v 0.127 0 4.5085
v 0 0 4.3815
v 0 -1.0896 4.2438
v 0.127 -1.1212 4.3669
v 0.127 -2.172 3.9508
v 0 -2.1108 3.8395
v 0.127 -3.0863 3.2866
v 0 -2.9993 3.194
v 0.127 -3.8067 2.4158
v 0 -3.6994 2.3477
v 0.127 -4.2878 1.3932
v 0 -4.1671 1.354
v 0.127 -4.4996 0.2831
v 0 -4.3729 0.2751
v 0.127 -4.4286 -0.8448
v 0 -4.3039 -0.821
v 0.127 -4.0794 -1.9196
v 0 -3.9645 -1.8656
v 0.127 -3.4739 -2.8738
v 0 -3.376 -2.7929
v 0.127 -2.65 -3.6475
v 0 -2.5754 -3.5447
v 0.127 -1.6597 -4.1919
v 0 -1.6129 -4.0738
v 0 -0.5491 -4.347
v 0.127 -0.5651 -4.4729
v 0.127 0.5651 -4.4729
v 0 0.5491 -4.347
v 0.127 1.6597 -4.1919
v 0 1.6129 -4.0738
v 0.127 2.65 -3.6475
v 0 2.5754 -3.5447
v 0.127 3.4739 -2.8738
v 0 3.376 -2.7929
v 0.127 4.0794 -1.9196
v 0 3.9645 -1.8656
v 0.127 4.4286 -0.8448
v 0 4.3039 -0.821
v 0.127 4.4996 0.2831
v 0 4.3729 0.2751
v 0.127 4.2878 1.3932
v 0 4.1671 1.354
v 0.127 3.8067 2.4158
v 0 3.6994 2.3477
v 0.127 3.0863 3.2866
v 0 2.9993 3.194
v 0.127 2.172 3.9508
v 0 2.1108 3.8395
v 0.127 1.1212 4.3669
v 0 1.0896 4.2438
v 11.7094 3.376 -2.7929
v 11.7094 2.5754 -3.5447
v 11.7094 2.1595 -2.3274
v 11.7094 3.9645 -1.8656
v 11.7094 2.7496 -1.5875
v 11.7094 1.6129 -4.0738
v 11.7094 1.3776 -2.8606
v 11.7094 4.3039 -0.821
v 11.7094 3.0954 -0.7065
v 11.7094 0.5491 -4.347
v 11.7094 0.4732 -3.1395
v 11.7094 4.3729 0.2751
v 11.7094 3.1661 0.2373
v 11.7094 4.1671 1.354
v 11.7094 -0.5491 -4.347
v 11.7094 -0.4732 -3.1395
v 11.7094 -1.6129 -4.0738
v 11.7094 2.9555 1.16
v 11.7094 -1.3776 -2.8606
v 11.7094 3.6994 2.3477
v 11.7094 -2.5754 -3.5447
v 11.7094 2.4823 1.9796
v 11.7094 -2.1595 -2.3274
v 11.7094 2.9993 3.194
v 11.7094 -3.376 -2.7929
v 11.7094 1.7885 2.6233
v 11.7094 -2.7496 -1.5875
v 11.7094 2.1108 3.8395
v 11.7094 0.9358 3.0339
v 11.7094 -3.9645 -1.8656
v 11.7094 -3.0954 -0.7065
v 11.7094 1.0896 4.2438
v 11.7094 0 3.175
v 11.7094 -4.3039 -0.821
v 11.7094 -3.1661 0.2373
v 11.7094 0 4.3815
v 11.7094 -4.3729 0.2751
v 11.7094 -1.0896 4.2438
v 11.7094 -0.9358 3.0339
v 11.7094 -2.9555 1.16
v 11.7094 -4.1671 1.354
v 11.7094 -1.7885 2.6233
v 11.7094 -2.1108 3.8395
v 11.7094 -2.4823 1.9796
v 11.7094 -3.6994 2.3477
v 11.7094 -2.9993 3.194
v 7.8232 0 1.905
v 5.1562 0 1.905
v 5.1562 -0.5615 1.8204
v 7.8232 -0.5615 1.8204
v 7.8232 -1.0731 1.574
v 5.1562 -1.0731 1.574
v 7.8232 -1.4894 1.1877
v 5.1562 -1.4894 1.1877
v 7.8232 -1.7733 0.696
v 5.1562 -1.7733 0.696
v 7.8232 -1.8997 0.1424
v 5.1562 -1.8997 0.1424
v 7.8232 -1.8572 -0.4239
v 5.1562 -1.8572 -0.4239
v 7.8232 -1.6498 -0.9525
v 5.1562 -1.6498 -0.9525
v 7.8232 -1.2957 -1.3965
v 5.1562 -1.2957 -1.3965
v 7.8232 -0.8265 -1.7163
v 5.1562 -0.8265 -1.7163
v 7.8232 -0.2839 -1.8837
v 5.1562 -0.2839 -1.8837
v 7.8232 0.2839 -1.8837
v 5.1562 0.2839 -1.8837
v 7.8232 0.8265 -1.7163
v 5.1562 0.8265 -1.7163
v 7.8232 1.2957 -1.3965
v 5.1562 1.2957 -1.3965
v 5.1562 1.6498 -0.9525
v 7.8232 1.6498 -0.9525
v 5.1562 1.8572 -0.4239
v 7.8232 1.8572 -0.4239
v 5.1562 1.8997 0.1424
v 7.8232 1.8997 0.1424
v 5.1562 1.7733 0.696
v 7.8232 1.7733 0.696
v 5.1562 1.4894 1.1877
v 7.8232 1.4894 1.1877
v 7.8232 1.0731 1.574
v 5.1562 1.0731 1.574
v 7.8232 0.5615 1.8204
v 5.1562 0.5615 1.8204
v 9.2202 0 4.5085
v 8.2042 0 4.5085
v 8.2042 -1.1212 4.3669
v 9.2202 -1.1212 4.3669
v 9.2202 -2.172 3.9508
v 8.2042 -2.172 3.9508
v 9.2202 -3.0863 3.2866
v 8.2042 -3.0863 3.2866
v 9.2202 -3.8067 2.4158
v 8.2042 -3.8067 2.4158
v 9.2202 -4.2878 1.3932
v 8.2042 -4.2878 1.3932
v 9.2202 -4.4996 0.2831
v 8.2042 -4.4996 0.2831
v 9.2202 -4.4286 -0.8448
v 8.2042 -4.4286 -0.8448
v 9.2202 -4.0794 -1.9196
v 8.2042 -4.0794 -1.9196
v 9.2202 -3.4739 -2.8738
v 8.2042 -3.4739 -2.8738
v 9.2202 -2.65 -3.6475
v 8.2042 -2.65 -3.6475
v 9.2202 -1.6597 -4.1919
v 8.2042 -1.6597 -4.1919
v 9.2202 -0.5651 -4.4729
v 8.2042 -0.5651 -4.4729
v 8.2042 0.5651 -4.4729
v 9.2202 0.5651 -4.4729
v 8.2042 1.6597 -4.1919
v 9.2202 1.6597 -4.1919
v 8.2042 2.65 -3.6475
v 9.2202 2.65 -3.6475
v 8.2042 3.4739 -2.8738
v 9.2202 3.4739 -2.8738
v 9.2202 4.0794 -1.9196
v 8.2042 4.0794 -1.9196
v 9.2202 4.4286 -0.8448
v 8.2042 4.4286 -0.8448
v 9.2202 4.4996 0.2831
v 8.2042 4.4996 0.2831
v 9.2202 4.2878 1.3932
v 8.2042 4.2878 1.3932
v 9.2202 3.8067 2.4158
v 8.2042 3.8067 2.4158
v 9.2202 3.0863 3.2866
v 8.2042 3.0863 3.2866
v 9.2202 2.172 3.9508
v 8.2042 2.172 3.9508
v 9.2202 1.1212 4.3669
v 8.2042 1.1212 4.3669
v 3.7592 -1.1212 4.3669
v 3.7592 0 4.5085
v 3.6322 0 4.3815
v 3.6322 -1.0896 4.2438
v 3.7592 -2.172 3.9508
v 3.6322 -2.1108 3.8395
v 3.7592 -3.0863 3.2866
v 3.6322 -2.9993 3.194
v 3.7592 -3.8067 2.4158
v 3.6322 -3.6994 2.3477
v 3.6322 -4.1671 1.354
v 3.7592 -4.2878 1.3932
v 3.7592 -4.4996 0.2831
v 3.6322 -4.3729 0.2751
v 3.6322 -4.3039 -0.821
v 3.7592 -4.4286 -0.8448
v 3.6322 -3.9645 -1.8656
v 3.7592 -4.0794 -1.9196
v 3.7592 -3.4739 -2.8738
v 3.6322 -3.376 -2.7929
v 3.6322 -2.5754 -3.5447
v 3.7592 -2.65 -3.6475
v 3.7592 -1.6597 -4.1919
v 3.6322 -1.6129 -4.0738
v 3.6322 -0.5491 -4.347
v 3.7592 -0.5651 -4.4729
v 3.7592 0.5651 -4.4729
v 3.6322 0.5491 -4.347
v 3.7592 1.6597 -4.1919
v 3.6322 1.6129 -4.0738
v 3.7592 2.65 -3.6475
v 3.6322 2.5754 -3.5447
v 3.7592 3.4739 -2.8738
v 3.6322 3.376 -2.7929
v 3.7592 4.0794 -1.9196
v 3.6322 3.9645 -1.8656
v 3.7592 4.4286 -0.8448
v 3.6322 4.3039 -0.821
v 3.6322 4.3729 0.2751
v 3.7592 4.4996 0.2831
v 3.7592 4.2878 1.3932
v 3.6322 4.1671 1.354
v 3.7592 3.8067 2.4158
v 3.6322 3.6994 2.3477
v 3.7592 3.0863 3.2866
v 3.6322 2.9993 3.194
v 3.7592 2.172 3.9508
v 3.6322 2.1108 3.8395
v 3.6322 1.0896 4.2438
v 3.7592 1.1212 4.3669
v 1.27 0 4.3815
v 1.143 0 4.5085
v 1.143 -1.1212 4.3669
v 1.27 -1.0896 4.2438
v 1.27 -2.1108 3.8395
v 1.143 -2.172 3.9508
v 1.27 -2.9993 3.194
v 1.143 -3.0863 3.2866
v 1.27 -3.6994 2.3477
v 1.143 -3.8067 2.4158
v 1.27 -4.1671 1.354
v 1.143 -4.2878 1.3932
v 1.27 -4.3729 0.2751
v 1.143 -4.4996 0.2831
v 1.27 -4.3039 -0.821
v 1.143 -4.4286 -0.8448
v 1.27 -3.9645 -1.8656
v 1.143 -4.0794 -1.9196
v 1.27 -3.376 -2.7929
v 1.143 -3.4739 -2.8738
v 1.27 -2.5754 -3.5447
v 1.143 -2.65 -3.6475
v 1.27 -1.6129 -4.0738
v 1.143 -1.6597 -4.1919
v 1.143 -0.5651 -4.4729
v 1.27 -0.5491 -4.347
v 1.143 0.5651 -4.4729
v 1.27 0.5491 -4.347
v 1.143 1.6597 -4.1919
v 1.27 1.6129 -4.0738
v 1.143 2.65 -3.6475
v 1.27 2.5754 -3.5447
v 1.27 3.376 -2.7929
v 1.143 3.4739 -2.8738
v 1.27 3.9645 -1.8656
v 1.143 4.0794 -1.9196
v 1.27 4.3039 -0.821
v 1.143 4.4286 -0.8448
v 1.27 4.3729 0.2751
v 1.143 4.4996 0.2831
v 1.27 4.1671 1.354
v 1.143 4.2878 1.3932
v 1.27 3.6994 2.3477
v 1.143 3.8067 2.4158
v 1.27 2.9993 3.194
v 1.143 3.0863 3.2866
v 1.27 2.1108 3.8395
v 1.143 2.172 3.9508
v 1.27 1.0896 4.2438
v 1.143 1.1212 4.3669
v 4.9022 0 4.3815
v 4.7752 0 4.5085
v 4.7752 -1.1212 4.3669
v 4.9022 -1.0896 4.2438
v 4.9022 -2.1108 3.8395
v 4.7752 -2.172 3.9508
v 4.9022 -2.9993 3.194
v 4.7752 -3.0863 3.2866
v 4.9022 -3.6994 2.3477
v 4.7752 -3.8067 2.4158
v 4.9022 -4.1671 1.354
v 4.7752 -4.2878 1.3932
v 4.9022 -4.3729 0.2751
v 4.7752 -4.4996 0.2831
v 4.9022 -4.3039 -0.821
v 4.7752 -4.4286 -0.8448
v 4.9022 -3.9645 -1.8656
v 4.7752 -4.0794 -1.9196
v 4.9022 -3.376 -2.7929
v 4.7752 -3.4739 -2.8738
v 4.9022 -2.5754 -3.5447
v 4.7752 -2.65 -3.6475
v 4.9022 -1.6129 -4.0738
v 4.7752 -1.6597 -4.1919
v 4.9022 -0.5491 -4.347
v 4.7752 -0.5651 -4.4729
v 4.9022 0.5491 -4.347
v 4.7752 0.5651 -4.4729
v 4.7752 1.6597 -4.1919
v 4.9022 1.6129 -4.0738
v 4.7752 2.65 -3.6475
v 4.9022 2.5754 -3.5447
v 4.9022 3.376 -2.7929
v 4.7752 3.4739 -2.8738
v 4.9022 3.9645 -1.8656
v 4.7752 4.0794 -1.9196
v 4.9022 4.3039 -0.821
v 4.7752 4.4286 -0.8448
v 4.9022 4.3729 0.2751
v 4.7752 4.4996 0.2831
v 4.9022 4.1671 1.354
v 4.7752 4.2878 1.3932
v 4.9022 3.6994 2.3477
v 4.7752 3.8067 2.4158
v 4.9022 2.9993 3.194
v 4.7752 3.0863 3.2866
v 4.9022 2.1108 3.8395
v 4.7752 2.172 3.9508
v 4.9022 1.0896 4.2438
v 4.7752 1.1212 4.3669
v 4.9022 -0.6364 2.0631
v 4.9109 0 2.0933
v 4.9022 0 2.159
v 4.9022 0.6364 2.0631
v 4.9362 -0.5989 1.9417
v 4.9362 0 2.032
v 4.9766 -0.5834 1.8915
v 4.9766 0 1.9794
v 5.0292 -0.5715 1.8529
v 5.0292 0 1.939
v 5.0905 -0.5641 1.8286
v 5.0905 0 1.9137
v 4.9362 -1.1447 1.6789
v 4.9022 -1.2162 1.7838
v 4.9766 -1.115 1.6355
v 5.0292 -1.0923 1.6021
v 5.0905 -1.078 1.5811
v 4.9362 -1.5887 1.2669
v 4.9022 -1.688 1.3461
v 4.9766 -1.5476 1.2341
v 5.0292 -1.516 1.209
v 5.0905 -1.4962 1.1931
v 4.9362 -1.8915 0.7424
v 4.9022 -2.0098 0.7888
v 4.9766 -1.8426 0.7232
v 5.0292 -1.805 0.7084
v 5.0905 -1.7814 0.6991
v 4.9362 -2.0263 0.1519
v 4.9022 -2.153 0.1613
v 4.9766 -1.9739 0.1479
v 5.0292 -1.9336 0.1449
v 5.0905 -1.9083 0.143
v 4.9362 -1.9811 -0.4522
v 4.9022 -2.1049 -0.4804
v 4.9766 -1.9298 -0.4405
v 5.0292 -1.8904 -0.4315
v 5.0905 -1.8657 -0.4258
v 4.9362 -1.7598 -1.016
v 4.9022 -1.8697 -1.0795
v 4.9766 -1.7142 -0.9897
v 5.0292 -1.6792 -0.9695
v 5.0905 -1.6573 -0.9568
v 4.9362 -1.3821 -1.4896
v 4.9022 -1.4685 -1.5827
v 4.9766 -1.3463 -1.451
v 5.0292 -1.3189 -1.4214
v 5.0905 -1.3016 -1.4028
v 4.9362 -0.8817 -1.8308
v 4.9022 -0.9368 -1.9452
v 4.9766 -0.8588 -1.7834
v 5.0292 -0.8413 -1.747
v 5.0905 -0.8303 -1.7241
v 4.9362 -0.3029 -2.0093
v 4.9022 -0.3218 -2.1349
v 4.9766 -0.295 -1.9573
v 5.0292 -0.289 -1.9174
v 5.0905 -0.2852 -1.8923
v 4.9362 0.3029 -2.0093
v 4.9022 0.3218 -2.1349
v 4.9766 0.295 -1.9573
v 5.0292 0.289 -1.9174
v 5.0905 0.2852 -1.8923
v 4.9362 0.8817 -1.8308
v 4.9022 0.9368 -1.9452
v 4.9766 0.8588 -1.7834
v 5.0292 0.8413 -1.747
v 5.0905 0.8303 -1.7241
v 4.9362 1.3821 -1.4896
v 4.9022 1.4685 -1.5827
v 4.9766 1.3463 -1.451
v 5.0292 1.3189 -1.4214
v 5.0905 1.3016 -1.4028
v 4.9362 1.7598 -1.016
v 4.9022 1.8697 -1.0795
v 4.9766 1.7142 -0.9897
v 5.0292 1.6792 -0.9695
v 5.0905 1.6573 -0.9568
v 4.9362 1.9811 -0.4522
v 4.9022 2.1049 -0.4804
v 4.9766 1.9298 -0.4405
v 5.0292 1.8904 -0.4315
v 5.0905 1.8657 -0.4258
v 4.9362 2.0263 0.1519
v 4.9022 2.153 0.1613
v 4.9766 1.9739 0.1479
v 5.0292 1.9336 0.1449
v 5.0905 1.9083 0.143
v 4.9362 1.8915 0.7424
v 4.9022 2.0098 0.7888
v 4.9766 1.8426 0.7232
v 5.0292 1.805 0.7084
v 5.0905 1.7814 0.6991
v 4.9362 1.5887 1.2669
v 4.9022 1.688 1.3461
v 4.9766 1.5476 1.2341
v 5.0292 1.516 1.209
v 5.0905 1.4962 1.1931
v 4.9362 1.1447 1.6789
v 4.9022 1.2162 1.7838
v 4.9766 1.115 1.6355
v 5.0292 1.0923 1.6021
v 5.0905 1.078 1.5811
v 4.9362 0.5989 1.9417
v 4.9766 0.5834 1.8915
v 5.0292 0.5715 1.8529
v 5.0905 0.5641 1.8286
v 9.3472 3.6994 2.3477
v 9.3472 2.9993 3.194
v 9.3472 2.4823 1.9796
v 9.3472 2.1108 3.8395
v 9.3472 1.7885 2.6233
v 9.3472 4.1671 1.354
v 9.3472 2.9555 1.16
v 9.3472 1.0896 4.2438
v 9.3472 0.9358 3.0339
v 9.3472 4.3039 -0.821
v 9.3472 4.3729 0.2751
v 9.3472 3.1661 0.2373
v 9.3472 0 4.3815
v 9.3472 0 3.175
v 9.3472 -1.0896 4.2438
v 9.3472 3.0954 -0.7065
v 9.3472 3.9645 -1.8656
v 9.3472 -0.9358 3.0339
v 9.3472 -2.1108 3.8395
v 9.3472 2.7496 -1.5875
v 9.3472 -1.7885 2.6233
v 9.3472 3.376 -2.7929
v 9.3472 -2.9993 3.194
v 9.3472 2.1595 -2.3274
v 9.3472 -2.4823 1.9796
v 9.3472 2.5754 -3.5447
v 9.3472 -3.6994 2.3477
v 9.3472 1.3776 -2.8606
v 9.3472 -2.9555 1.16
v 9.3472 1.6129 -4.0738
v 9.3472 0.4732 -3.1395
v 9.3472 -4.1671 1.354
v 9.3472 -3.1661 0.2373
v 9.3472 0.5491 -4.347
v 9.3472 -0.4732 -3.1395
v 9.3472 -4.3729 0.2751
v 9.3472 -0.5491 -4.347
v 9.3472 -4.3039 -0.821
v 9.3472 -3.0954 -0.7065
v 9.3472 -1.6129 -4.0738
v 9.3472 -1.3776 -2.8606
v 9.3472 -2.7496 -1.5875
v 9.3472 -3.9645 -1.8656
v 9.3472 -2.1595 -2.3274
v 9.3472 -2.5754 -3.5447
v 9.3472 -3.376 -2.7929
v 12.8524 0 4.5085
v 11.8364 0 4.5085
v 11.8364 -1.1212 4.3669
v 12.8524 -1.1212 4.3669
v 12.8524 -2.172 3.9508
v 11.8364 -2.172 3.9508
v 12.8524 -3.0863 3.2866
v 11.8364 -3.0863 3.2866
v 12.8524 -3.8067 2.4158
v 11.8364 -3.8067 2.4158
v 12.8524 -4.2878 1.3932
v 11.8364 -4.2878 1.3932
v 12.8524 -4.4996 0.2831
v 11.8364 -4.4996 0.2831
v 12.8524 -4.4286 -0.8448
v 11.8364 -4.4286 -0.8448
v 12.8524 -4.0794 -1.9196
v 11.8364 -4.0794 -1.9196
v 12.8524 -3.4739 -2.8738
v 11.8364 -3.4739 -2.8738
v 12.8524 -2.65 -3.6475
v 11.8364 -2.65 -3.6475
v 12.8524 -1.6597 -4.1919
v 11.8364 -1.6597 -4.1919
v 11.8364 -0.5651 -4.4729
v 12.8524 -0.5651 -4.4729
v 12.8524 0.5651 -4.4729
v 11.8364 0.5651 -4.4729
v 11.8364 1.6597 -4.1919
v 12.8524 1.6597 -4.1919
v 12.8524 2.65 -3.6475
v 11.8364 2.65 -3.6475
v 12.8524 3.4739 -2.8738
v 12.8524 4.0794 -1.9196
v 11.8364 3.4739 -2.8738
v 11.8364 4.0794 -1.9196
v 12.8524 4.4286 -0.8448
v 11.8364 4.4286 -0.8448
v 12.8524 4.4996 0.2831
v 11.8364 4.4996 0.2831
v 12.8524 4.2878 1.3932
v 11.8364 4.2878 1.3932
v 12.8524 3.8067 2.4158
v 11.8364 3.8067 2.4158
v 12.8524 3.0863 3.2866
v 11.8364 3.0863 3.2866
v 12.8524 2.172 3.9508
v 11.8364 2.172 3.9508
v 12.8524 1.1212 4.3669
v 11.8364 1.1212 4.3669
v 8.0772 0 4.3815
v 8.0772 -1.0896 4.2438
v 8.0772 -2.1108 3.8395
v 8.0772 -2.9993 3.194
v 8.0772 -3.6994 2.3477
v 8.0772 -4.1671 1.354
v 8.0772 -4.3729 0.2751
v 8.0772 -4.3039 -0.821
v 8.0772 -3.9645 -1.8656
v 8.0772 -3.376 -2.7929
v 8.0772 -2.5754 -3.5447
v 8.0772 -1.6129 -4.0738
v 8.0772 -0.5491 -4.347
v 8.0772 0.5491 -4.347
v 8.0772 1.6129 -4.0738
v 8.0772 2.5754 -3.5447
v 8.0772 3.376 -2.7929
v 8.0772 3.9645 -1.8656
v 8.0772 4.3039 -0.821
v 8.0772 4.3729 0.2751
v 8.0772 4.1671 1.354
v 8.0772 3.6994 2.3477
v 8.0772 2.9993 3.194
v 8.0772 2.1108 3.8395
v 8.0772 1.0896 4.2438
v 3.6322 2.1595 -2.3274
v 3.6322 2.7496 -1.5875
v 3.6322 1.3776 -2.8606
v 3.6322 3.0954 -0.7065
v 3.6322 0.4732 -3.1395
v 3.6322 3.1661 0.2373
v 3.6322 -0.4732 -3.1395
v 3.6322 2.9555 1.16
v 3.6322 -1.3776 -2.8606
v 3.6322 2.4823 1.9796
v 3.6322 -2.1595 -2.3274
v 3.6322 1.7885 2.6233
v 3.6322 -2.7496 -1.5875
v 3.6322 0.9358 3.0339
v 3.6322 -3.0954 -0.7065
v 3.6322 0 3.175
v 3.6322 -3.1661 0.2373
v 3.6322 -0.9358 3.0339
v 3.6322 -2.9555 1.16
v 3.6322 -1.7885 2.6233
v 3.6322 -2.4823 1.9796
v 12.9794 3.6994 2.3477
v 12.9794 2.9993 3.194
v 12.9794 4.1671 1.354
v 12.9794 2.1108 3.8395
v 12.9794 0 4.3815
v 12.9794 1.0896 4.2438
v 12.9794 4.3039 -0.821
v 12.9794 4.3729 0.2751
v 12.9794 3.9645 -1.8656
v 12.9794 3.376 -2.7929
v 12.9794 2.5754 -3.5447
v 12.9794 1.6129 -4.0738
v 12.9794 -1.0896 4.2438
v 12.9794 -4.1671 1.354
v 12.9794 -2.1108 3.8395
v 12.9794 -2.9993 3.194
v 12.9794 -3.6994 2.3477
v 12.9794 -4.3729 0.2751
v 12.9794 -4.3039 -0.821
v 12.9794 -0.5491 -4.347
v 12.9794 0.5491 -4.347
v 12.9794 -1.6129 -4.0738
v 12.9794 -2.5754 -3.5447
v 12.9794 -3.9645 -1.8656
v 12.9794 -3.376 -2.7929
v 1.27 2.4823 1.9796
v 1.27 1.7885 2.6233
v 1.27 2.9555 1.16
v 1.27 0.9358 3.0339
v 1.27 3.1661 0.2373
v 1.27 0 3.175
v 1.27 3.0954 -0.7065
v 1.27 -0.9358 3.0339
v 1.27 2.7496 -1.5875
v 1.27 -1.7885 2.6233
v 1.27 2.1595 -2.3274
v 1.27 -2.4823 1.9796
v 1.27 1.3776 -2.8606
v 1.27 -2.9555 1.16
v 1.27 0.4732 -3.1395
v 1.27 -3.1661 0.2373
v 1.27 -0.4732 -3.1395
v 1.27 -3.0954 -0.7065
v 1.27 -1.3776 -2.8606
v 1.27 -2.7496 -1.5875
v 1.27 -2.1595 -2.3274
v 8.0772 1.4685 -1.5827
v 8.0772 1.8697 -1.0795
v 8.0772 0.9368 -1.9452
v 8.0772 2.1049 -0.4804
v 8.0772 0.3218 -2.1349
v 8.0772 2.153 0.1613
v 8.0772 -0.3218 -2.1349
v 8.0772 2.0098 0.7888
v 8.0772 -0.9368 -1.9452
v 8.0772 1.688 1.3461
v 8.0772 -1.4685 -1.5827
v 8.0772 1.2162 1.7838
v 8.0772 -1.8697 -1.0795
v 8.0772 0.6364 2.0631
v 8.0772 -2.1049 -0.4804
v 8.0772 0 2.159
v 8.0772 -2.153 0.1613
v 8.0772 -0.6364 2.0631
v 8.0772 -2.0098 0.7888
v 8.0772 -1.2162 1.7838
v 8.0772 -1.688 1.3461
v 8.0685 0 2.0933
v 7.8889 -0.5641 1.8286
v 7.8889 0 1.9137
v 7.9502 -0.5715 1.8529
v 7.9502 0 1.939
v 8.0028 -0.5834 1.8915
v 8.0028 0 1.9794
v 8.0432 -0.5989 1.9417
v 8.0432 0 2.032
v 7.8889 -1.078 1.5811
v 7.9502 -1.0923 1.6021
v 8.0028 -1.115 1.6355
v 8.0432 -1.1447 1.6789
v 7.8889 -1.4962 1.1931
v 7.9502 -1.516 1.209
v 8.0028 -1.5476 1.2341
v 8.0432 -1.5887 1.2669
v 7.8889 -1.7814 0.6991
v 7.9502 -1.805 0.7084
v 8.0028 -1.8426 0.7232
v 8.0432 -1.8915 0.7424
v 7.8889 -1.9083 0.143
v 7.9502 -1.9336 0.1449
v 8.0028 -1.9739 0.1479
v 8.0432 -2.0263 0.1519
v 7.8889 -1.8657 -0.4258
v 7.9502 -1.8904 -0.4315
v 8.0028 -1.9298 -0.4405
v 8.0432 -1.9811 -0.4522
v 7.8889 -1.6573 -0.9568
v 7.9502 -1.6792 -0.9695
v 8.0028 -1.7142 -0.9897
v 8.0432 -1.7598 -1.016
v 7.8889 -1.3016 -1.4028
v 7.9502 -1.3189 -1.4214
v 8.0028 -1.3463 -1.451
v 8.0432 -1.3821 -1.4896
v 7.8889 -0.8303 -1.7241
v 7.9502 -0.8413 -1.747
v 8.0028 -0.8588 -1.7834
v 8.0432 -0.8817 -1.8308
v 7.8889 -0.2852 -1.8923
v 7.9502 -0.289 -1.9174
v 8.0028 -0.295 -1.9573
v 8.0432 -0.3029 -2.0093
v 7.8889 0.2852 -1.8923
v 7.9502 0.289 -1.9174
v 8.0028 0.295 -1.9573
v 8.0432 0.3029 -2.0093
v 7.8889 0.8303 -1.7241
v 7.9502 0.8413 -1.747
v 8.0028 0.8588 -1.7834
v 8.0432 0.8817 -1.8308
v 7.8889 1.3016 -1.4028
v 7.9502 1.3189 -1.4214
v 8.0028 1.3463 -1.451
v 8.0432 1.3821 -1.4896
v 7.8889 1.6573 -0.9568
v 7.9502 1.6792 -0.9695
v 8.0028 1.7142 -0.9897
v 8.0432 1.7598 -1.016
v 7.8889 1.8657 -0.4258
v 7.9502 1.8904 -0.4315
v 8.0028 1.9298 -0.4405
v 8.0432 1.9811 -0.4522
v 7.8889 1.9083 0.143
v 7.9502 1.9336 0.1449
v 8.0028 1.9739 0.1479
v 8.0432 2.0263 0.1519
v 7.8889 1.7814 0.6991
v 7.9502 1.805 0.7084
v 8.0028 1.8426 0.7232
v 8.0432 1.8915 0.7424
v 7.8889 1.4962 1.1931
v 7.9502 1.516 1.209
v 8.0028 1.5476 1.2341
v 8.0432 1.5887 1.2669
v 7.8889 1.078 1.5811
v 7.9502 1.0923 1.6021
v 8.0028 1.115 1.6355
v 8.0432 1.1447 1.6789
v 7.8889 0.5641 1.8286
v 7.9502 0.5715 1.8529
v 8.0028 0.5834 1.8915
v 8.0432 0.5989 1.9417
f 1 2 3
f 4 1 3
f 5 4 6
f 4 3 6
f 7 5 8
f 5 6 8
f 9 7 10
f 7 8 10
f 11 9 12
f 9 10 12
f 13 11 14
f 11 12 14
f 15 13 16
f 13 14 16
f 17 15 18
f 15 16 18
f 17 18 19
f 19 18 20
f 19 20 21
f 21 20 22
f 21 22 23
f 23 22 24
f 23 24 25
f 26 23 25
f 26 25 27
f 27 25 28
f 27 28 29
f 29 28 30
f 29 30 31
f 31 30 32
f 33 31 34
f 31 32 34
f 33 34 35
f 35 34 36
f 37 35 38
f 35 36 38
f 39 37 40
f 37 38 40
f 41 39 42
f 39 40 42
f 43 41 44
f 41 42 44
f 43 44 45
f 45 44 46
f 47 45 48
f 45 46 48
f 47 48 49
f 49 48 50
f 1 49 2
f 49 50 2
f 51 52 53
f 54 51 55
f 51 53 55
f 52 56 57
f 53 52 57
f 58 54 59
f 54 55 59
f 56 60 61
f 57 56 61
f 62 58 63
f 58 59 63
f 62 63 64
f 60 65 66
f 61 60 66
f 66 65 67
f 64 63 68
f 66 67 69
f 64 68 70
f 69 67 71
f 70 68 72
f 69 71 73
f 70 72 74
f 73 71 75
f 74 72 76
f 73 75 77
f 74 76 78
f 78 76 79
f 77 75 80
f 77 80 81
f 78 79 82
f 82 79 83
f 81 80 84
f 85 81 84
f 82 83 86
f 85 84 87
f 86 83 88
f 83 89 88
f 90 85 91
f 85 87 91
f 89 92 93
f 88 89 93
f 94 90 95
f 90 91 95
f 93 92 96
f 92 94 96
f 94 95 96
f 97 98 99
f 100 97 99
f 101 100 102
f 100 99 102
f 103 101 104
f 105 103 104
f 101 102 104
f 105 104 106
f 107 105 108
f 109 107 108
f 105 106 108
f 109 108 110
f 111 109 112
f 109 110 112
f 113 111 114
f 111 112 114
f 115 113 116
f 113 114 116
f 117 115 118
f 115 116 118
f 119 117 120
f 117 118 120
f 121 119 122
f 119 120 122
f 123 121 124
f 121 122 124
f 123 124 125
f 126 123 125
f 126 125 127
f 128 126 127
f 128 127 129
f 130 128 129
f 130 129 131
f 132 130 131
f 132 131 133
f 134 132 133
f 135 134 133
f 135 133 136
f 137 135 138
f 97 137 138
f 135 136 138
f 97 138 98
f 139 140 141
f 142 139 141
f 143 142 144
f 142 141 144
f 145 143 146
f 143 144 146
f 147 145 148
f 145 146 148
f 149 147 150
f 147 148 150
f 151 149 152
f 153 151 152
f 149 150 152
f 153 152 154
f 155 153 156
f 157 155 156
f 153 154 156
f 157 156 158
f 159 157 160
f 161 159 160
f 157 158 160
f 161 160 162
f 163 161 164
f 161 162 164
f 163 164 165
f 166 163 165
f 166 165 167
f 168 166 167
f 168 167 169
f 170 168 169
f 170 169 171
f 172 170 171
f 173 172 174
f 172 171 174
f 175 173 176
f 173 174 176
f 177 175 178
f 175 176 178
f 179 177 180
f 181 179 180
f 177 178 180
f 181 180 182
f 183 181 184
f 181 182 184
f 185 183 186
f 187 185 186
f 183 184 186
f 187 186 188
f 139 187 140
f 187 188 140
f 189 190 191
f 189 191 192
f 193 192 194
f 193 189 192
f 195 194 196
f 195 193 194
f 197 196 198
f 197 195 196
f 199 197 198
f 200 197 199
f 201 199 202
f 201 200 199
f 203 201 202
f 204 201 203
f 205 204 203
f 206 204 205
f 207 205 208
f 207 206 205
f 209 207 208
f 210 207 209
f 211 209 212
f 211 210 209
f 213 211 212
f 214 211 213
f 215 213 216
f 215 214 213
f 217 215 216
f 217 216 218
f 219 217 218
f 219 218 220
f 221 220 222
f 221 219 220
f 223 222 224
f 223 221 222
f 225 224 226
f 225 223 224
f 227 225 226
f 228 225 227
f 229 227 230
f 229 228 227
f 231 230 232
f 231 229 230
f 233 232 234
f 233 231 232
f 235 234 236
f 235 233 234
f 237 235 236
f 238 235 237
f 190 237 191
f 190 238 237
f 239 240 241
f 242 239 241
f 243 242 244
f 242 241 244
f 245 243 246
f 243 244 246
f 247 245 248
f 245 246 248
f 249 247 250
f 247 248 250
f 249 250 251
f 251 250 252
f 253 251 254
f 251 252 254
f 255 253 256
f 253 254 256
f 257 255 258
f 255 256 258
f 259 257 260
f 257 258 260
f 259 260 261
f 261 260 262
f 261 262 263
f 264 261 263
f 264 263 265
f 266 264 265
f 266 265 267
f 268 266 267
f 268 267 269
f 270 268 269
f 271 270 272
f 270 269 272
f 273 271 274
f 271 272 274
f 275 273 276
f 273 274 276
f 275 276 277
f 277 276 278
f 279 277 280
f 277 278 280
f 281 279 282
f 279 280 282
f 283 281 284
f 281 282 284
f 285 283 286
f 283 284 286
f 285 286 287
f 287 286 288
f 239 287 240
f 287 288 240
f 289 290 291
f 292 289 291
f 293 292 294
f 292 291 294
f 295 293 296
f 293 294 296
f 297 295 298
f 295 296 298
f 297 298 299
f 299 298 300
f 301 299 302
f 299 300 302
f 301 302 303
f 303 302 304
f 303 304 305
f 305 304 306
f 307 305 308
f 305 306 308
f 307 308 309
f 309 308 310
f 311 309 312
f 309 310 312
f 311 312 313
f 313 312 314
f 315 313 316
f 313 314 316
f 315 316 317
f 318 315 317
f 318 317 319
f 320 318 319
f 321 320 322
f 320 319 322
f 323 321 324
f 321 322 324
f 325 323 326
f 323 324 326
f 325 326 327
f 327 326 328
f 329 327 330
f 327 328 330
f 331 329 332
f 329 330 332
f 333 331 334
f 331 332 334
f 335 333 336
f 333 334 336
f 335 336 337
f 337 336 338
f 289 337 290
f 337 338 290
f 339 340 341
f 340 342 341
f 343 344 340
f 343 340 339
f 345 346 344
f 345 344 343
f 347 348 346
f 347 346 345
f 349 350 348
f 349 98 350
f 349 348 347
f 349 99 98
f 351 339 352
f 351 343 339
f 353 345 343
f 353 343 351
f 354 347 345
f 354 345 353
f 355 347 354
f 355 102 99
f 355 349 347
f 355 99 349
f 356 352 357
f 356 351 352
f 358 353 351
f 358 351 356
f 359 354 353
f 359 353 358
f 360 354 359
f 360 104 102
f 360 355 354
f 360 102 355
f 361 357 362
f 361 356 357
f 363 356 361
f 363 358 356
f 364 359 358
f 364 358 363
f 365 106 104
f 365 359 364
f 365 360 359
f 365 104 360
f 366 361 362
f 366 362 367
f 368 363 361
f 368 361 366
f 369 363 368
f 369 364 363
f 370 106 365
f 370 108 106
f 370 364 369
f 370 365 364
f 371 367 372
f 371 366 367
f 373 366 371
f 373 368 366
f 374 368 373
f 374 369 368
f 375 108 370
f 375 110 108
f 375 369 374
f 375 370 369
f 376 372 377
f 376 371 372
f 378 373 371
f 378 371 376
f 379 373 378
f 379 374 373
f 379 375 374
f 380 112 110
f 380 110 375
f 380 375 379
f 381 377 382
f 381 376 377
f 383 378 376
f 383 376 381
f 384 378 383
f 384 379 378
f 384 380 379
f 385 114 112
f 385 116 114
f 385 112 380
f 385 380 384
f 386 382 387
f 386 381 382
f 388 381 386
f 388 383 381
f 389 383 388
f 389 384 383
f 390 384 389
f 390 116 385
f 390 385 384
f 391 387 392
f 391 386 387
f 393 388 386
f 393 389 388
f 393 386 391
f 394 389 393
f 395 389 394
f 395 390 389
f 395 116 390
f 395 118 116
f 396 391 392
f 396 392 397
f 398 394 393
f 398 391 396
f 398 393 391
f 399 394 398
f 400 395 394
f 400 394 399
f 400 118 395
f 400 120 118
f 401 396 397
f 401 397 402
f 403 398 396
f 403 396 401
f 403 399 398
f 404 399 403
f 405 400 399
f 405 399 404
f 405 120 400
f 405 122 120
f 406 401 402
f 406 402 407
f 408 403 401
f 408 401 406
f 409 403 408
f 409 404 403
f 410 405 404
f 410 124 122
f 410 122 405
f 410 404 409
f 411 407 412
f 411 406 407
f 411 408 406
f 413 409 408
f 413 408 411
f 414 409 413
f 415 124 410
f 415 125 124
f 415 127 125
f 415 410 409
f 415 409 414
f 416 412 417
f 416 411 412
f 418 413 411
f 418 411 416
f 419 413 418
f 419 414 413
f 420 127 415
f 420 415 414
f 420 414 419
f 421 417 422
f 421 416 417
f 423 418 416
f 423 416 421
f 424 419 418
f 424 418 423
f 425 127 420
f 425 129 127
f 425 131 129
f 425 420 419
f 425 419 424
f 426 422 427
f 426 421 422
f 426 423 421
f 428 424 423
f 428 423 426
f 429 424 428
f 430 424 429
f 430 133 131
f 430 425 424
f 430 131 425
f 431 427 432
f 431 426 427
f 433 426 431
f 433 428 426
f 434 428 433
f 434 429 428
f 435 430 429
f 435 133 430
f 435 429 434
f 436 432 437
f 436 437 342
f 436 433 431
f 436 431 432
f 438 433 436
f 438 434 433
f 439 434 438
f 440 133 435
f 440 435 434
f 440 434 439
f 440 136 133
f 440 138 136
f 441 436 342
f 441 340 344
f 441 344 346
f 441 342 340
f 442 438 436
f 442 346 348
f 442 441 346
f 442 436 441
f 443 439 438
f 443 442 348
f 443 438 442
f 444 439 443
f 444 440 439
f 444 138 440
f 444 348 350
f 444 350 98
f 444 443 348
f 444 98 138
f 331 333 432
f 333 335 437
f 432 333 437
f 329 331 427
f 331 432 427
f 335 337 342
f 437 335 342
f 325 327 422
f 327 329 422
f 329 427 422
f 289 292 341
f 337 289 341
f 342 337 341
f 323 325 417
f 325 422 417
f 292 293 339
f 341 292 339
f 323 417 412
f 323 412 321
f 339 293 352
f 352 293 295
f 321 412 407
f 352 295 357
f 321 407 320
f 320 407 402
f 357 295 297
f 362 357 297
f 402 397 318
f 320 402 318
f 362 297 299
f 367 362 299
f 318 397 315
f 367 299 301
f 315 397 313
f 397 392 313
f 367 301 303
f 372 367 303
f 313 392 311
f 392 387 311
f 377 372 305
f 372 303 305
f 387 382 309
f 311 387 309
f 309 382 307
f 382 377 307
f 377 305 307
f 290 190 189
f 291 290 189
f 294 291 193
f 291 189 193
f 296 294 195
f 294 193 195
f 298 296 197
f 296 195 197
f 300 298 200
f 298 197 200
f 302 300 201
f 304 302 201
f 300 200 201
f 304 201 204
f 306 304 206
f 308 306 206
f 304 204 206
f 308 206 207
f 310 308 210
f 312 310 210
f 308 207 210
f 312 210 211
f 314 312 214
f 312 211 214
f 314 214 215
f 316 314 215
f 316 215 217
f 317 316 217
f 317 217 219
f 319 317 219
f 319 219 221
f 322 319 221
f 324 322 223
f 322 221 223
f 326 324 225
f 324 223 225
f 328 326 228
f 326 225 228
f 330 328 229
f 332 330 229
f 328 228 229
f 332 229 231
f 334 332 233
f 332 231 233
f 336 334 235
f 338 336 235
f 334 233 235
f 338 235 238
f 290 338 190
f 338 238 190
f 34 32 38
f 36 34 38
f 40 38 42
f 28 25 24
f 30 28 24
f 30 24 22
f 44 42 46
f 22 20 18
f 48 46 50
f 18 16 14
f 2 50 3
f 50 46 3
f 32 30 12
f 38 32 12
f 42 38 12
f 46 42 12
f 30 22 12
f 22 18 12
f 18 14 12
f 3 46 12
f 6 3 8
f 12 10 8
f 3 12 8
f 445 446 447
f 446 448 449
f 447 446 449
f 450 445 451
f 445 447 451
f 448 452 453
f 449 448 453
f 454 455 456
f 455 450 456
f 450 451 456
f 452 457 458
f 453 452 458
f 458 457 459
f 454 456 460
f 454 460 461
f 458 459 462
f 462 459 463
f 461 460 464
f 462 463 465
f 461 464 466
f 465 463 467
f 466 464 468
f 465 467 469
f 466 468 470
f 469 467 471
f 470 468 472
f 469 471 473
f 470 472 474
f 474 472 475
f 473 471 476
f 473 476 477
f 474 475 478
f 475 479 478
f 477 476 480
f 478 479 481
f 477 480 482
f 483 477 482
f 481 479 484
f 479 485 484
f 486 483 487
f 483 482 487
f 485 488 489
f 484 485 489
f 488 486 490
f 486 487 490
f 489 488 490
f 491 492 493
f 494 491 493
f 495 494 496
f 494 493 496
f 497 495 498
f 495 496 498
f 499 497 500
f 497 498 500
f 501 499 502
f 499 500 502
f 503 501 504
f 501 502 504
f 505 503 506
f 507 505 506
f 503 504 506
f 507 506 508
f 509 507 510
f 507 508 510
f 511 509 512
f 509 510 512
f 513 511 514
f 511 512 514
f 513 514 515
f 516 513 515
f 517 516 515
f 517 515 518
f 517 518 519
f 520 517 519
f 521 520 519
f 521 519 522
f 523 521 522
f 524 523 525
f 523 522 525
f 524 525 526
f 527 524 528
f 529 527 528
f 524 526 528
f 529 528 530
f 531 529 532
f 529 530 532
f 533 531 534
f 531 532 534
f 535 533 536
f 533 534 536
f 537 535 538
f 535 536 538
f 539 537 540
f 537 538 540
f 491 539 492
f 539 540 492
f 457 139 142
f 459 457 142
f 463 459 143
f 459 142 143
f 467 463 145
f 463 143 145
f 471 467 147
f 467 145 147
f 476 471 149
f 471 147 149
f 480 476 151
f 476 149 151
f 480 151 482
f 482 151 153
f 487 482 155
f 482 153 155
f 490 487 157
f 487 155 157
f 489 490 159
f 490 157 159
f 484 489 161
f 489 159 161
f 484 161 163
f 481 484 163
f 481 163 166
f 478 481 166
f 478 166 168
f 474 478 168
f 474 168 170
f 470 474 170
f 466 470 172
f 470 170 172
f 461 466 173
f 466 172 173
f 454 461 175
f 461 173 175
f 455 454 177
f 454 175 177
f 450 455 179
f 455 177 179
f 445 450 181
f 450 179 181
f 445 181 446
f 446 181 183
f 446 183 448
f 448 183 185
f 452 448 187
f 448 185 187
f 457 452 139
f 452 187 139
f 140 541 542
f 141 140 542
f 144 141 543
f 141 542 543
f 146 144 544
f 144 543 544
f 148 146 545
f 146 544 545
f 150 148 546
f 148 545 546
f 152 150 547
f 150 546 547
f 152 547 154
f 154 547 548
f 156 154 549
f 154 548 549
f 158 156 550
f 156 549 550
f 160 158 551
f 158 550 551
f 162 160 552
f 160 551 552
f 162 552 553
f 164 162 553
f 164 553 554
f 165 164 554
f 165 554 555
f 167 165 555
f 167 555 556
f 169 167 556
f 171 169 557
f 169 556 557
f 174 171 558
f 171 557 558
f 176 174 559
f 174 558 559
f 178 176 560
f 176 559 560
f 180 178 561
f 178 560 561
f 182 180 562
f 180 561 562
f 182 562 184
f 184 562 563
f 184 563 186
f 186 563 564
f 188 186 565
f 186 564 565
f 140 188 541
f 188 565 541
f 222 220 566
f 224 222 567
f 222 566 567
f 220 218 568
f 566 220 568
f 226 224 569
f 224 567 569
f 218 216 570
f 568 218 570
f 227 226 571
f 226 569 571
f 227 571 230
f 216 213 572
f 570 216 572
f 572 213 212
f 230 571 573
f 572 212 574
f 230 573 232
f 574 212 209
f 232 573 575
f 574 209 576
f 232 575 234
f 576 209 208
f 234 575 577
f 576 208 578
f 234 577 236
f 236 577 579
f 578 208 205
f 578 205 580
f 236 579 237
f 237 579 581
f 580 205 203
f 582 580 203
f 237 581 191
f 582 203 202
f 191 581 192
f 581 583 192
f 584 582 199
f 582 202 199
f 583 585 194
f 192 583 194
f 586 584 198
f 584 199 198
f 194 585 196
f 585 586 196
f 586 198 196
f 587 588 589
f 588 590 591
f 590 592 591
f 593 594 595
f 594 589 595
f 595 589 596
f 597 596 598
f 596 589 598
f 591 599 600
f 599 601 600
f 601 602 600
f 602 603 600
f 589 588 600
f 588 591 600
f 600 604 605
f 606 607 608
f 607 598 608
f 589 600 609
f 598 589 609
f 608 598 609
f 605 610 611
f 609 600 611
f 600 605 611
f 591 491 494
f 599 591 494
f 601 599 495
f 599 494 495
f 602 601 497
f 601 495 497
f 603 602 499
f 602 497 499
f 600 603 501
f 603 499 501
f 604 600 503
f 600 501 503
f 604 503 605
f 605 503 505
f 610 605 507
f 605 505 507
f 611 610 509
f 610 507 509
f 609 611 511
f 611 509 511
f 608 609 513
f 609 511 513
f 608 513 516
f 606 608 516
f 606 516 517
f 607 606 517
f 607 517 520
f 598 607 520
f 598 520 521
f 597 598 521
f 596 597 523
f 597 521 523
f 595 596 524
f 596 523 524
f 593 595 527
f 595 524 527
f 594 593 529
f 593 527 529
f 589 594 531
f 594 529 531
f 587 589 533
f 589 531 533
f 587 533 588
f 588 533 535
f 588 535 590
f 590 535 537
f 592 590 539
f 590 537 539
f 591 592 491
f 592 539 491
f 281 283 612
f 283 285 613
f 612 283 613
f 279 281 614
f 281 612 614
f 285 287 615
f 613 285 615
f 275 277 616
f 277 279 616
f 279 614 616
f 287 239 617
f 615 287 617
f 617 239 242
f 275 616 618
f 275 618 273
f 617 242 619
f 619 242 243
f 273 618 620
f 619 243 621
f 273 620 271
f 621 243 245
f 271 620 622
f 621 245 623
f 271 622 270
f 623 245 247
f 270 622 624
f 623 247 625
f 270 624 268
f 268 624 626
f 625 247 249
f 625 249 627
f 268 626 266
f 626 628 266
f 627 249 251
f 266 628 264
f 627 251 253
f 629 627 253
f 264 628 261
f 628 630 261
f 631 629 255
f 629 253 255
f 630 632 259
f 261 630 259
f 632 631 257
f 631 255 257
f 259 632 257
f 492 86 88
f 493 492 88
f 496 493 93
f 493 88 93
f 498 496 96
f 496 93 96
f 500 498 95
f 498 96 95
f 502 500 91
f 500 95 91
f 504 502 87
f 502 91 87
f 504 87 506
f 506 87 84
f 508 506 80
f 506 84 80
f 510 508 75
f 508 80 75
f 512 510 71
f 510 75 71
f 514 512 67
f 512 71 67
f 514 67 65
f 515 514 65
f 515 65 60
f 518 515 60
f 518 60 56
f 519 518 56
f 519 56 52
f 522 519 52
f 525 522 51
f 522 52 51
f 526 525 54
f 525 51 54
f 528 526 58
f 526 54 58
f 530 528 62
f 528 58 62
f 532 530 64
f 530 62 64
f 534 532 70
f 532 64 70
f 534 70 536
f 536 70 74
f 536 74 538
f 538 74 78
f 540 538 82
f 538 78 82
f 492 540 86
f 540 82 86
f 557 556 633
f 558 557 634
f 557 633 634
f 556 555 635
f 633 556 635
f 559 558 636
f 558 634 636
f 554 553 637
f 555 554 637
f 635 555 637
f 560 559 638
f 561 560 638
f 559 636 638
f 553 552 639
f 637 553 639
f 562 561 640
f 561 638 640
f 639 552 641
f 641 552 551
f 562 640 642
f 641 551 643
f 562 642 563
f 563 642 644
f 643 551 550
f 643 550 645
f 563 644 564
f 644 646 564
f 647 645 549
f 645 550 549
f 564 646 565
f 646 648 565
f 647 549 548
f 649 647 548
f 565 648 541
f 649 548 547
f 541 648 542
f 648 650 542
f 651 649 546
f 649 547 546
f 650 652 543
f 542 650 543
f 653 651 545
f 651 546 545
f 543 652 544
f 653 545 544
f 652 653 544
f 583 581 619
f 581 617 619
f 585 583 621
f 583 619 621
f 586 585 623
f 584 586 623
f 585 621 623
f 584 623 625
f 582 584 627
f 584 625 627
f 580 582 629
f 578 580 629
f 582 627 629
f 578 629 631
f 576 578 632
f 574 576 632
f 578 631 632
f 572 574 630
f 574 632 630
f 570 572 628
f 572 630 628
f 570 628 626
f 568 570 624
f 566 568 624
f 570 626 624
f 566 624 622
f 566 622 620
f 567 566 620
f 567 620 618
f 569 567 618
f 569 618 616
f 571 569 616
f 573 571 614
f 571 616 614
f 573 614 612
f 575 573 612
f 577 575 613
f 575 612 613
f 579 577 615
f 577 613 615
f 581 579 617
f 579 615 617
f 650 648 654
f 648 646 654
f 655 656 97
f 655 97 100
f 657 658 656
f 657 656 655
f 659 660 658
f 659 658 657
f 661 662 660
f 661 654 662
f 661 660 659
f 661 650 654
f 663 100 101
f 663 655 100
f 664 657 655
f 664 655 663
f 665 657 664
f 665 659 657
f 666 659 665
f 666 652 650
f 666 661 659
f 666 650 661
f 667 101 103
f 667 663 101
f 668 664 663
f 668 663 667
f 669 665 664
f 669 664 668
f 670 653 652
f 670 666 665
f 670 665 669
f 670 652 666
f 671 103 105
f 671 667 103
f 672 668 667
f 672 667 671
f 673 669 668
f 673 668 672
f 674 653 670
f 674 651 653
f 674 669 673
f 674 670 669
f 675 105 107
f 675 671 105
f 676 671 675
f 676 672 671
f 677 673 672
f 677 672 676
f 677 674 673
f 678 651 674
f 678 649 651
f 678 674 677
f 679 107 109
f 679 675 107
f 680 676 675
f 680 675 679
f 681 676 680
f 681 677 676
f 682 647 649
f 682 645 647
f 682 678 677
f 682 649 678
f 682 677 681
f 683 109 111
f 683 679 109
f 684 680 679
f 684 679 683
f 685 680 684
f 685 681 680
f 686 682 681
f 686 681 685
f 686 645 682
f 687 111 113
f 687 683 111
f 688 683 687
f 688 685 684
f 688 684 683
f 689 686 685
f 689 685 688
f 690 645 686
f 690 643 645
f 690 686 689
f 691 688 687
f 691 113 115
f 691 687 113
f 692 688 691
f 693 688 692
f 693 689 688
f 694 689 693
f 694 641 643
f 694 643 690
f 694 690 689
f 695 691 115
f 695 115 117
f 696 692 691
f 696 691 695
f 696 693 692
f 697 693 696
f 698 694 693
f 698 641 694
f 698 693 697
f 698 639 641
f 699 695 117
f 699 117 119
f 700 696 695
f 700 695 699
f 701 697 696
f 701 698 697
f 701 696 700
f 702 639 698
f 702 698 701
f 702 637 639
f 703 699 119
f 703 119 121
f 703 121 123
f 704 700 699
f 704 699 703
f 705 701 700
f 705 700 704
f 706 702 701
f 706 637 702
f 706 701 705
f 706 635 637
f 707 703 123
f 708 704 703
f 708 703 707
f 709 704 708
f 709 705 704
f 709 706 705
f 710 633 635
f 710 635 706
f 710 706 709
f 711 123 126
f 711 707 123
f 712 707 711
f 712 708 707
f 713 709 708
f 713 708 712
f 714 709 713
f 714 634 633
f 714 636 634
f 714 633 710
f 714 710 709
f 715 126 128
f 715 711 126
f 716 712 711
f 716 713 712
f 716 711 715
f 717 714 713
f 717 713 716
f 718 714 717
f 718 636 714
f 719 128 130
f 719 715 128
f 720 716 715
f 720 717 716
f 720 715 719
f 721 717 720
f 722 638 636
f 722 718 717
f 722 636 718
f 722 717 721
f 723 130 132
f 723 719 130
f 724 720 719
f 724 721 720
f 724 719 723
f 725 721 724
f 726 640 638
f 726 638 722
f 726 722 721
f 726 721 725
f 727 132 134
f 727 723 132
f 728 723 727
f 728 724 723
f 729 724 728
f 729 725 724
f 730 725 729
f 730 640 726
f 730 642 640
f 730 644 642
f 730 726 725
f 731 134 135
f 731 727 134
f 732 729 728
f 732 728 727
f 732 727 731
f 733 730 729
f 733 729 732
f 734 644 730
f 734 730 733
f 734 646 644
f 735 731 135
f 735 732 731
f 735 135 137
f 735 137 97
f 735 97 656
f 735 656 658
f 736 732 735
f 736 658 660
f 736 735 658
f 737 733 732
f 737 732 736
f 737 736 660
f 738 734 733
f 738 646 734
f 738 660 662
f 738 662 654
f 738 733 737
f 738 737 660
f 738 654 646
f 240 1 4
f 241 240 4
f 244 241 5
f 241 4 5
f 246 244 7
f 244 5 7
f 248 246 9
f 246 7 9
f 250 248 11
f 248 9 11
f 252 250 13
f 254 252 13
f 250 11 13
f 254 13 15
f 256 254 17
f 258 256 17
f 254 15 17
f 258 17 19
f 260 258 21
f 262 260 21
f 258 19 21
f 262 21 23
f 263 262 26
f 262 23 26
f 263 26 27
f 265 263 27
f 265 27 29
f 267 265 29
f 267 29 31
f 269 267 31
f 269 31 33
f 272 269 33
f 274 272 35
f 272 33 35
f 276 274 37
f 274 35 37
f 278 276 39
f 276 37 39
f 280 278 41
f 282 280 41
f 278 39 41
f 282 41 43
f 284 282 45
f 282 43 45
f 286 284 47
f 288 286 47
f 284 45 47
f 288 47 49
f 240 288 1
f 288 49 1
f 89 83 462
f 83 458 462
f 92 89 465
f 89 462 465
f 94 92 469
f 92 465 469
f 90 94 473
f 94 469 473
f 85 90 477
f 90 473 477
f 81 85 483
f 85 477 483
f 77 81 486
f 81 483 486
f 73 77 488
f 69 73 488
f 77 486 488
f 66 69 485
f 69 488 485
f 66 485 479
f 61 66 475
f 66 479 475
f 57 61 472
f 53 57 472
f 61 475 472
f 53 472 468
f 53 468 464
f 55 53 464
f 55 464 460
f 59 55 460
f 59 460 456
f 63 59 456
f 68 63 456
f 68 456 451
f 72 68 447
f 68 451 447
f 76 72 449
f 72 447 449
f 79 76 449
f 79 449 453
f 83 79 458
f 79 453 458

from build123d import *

# Parameters (mm, degrees)
VENT_EDGE_BREAK_SIZE = 0.127
FILLET1_R            = 0.254


with BuildPart() as part:
    # Sketch2 → Revolve1 (revolve)
    with BuildSketch(Plane.XY, mode=Mode.PRIVATE) as revolve1_sk:
        Polygon((3.6322, 4.5085), (3.6322, 3.175), (1.27, 3.175), (1.27, 4.5085), (0, 4.5085), (0, 0), (12.9794, 0), (12.9794, 4.5085), (11.7094, 4.5085), (11.7094, 3.175), (9.3472, 3.175), (9.3472, 4.5085), (8.0772, 4.5085), (8.0772, 1.905), (4.9022, 1.905), (4.9022, 4.5085), align=None)
    revolve(revolve1_sk.sketch.rotate(Axis((-1.617419624, 0, 0), (1, 0, 0)), 90), axis=Axis((-1.617419624, 0, 0), (1, 0, 0)))

    # vent-edge-break
    vent_edge_break_edges = [part.edges().sort_by_distance(p)[0] for p in [
        (1.27, 0, -4.5085),
        (3.6322, 0, -4.5085),
        (4.9022, 0, -4.5085),
        (8.0772, 0, -4.5085),
        (9.3472, 0, -4.5085),
        (11.7094, 0, -4.5085),
        (12.9794, 0, -4.5085),
        (0, 0, -4.5085),
    ]]
    chamfer(vent_edge_break_edges, length=VENT_EDGE_BREAK_SIZE)

    # Fillet1
    fillet1_edges = [part.edges().sort_by_distance(p)[0] for p in [
        (4.9022, 0, -1.905),
        (8.0772, 0, -1.905),
    ]]
    fillet(fillet1_edges, radius=FILLET1_R)


solid = part.part
